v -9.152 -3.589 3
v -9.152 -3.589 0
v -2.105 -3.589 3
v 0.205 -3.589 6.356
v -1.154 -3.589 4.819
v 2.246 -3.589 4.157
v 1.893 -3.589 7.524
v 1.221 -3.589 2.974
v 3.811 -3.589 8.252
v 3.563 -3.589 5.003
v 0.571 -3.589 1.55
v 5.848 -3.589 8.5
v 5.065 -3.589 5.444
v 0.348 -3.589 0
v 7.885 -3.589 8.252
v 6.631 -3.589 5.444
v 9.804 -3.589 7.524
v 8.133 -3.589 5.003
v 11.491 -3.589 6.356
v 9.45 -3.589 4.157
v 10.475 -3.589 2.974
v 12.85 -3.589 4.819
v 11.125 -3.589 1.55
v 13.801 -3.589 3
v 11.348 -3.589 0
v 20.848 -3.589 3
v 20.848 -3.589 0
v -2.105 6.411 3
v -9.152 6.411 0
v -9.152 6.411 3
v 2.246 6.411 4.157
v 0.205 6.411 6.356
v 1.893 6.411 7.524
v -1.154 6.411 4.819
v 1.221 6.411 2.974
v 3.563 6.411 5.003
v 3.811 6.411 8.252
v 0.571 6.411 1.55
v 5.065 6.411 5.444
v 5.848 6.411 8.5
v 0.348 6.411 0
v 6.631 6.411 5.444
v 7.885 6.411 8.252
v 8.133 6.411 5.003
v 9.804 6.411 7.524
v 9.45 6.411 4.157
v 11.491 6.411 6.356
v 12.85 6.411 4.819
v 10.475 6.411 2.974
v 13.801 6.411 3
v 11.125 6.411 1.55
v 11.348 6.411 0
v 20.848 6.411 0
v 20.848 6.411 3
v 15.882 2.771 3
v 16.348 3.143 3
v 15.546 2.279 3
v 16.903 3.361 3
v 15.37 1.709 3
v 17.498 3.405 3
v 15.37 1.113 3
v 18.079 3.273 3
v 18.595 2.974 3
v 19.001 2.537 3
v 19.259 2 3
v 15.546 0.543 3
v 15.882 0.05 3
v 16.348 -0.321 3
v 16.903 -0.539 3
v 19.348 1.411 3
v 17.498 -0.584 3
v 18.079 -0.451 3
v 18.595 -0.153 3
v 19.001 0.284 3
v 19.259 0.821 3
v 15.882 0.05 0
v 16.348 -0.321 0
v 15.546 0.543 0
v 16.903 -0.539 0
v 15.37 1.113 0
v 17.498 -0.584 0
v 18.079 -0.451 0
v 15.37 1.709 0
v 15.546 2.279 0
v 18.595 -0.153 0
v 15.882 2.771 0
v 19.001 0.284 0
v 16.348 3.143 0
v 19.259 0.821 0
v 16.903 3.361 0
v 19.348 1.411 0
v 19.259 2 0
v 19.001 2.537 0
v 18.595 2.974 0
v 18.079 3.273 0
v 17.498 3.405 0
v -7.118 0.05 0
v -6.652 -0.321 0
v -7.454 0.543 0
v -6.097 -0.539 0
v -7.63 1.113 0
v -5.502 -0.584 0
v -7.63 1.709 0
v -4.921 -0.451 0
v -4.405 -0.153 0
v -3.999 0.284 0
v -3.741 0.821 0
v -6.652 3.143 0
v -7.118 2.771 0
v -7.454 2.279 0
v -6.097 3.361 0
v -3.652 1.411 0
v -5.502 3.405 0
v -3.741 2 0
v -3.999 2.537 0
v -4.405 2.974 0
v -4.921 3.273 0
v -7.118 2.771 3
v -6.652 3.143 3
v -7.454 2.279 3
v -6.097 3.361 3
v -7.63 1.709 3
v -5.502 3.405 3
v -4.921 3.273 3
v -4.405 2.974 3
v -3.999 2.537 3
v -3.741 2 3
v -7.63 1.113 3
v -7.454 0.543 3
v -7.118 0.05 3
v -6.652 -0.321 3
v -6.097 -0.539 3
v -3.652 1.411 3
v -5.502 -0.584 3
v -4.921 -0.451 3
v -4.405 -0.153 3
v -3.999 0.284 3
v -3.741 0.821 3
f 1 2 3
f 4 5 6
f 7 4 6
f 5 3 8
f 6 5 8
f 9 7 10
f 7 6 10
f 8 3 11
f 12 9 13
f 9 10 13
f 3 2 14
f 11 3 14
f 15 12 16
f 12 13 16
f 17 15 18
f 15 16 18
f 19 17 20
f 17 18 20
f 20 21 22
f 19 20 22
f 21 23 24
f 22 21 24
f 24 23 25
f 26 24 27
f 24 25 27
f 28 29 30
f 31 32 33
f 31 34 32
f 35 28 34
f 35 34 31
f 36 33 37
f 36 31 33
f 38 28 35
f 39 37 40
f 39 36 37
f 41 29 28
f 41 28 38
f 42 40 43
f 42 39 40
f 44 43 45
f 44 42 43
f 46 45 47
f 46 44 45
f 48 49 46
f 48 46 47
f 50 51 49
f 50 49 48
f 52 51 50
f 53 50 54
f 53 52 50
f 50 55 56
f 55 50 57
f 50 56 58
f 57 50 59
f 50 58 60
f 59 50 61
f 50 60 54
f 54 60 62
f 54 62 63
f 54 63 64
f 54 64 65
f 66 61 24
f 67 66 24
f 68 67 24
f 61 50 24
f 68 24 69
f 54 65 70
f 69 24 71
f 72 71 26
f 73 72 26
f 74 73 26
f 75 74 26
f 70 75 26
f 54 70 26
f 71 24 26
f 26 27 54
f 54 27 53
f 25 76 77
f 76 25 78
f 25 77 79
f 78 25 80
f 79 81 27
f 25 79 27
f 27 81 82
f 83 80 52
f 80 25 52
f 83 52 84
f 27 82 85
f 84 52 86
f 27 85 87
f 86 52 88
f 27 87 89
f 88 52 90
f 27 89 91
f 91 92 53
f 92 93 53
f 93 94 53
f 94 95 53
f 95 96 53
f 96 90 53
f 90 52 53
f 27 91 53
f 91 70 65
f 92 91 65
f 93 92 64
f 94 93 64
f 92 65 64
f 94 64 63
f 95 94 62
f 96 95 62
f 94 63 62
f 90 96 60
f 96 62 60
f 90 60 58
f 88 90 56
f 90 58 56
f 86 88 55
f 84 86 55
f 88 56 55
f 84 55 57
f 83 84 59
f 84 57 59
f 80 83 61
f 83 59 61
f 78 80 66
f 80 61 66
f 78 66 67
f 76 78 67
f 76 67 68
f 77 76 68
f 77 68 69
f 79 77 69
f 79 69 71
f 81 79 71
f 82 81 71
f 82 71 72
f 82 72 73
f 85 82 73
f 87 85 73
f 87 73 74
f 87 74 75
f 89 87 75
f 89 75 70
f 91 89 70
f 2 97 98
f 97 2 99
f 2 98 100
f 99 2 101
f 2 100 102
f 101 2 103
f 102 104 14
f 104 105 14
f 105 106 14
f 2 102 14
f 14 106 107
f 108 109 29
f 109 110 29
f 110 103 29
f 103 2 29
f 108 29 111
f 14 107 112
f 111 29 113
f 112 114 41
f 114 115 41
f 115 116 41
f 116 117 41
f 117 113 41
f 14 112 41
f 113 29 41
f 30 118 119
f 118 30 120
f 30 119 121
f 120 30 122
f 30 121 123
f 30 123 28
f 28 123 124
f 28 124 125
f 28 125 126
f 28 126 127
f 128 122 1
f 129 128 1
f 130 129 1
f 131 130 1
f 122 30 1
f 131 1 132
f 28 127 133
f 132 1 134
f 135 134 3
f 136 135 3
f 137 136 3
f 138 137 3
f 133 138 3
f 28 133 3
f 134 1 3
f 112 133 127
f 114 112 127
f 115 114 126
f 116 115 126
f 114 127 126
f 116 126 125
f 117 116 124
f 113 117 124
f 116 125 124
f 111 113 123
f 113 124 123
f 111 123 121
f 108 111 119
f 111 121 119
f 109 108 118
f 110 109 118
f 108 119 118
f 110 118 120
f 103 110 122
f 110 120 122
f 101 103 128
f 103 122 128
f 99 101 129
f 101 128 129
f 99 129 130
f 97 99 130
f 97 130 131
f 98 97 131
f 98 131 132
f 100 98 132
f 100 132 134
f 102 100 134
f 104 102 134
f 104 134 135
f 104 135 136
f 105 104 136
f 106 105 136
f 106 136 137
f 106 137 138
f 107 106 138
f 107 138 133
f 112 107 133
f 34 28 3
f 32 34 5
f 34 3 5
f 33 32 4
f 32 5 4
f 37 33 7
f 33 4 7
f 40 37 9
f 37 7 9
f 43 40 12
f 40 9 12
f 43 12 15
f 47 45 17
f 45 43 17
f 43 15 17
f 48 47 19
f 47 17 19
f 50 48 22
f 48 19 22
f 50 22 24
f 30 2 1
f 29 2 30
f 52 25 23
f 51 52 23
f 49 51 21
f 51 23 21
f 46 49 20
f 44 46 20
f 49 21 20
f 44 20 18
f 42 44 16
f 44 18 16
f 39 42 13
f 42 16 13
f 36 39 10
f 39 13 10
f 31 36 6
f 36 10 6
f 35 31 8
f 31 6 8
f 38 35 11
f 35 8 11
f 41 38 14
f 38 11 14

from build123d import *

# Parameters (mm, degrees)
F0_W     = 30
F0_H     = 10
F1_DEPTH = 17
F3_DEPTH = 25
F4_R     = 2
F5_DEPTH = 25


with BuildPart() as f1:
    # F0 (on Top) → F1 (new body)
    with BuildSketch(Plane.XY):
        with Locations((5.848114, 1.410811)):
            Rectangle(F0_W, F0_H)
    extrude(amount=F1_DEPTH)

    # F2 (on face) → F3 (cut)
    with BuildSketch(Plane.XZ.offset(3.589189)):
        with BuildLine():
            ThreePointArc((-2.104872, 3), (5.848114, 8.5), (13.801101, 3))
            Line((13.801101, 3), (20.848114, 3))
            Line((20.848114, 3), (20.848114, 17))
            Line((20.848114, 17), (-9.151886, 17))
            Line((-9.151886, 17), (-9.151886, 3))
            Line((-9.151886, 3), (-2.104872, 3))
        make_face()
        with BuildLine():
            Line((0.348114, 0), (11.348114, 0))
            ThreePointArc((11.348114, 0), (5.848114, 5.5), (0.348114, 0))
        make_face()
    extrude(amount=-F3_DEPTH, mode=Mode.SUBTRACT)

    # F4 (on face) → F5 (cut)
    with BuildSketch(Plane.XY.offset(3)):
        with Locations((-5.651886, 1.410811)):
            Circle(F4_R)
        with Locations((17.348114, 1.410811)):
            Circle(F4_R)
    extrude(amount=-F5_DEPTH, mode=Mode.SUBTRACT)


solid = f1.part
